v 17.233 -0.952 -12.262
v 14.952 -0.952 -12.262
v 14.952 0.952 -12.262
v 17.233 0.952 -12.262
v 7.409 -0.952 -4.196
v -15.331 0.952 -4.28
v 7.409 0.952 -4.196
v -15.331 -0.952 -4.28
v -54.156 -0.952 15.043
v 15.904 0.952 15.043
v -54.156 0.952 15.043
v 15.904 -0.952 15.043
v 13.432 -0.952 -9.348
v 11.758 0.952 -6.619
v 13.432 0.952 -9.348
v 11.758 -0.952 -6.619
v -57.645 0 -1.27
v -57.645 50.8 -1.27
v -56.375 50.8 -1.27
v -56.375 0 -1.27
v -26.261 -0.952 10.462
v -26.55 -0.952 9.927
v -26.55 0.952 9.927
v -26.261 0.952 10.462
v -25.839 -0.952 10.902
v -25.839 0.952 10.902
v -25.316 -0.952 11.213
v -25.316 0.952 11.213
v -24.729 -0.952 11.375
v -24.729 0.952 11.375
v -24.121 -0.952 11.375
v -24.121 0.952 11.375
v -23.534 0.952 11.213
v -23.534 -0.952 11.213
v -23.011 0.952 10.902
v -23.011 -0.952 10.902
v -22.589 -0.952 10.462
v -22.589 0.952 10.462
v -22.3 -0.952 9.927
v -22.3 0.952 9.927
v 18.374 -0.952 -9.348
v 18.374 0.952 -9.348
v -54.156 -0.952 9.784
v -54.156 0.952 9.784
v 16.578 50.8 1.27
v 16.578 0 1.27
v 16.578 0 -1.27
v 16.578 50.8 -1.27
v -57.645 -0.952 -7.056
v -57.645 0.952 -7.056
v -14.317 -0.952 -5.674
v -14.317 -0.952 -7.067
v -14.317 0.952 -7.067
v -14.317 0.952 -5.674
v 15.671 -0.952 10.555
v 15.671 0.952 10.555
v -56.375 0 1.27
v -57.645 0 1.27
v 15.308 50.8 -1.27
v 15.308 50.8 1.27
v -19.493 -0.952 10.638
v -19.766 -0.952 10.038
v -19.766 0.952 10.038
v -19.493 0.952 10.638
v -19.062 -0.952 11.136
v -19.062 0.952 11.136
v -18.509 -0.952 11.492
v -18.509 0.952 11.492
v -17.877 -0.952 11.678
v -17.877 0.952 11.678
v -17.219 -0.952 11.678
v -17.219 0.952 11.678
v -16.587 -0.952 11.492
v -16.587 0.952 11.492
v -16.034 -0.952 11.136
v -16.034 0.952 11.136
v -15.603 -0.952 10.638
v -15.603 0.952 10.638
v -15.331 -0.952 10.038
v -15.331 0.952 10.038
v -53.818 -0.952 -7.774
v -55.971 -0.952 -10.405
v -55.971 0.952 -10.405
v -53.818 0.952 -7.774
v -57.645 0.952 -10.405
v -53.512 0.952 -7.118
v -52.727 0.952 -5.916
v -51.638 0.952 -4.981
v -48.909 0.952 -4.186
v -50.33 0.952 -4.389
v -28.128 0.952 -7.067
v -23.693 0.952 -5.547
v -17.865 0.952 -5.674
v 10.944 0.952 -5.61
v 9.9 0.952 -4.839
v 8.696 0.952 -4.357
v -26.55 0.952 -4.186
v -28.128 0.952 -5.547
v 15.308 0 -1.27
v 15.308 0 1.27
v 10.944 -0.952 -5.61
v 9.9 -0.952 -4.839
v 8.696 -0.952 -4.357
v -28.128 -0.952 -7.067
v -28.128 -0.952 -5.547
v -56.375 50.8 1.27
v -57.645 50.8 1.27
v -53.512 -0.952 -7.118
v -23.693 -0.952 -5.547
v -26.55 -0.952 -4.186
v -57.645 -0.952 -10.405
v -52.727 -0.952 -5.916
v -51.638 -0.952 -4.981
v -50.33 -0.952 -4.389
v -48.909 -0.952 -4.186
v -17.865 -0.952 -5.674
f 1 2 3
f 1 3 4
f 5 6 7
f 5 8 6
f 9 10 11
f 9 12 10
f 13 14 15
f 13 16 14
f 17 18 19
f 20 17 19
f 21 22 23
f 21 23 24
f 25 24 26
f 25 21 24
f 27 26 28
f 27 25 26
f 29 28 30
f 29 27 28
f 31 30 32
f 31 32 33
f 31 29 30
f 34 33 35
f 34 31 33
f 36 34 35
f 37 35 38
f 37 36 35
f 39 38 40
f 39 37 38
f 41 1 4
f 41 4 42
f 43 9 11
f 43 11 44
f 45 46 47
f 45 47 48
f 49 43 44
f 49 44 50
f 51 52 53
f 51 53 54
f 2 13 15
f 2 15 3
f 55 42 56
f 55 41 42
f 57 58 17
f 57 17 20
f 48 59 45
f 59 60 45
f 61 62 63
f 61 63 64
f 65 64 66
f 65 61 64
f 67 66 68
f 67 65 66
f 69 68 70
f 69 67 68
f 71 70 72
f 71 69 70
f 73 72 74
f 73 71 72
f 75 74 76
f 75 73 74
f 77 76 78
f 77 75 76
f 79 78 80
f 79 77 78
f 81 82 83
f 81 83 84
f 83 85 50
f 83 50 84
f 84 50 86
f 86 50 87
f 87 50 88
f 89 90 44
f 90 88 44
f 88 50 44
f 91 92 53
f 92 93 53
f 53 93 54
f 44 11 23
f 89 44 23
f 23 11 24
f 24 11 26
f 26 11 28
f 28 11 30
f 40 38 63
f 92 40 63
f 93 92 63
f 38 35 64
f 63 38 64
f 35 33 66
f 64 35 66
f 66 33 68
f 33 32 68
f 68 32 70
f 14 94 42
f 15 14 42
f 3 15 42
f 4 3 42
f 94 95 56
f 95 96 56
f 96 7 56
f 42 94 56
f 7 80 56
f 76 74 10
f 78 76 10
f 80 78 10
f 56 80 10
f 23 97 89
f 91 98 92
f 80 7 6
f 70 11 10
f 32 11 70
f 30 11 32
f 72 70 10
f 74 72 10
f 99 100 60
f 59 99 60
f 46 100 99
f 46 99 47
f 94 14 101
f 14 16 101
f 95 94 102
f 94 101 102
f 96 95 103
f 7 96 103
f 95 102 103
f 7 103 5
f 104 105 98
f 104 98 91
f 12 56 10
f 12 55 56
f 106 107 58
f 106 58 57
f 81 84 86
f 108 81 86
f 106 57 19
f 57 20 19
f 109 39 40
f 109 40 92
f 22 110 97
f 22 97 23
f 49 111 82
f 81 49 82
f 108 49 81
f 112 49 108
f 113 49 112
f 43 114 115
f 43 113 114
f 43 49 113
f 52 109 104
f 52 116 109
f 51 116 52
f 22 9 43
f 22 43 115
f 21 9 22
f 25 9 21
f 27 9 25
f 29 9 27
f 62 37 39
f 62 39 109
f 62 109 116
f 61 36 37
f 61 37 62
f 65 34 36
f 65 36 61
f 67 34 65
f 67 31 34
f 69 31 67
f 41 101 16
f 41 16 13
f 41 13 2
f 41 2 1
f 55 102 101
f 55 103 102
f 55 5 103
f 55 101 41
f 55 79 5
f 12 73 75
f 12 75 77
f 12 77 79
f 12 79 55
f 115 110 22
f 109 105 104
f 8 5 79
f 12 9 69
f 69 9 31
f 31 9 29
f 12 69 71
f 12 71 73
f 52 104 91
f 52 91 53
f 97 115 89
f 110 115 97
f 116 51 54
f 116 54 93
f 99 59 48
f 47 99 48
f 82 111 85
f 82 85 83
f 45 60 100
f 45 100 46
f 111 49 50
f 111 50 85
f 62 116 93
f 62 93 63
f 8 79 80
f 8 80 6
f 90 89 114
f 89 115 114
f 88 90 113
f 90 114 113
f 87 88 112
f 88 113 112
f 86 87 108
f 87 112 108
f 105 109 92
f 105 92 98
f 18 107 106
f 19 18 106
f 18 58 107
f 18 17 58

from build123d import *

# Parameters (mm, degrees)
F1_DEPTH = 0.9525
F2_W     = 1.27
F2_H     = 50.8
F3_DEPTH = 1.27
F4_R     = 5.08


with BuildPart() as f1:
    # F0 (on Front) → F1 (new body, symmetric)
    with BuildSketch(Plane.XZ):
        with BuildLine():
            Line((15.904324, 15.04276), (-54.155879, 15.04276))
            Line((-54.155879, 15.04276), (-54.155879, 9.78379))
            Line((-54.155879, 9.78379), (-57.645474, -7.056188))
            Line((-57.645474, -7.056188), (-57.645474, -10.404889))
            Line((-57.645474, -10.404889), (-55.97112, -10.404889))
            Line((-55.97112, -10.404889), (-53.818386, -7.773767))
            Line((-53.818386, -7.773767), (-52.144036, -4.185874))
            Line((-52.144036, -4.185874), (-26.550405, -4.185874))
            Line((-26.550405, -4.185874), (-26.550405, 9.926503))
            ThreePointArc((-26.550405, 9.926503), (-24.425041, 11.395424), (-22.299677, 9.926503))
            Line((-22.299677, 9.926503), (-23.693465, -5.546857))
            Line((-23.693465, -5.546857), (-28.128244, -5.546857))
            Line((-28.128244, -5.546857), (-28.128244, -7.067353))
            Line((-28.128244, -7.067353), (-14.317074, -7.067353))
            Line((-14.317074, -7.067353), (-14.317074, -5.673565))
            Line((-14.317074, -5.673565), (-17.864898, -5.673565))
            Line((-17.864898, -5.673565), (-19.765517, 10.038225))
            ThreePointArc((-19.765517, 10.038225), (-17.548127, 11.701358), (-15.330737, 10.038225))
            Line((-15.330737, 10.038225), (-15.330737, -4.279777))
            Line((-15.330737, -4.279777), (10.264277, -4.185874))
            Line((10.264277, -4.185874), (13.431975, -9.348096))
            Line((13.431975, -9.348096), (14.952471, -12.262381))
            Line((14.952471, -12.262381), (17.233215, -12.262381))
            Line((17.233215, -12.262381), (18.373586, -9.348096))
            Line((18.373586, -9.348096), (15.671084, 10.555249))
            Line((15.671084, 10.555249), (15.904324, 15.04276))
        make_face()
    extrude(amount=F1_DEPTH, both=True)

    # F4
    f4_edges = [f1.edges().sort_by_distance(p)[0] for p in [
        (-52.144036, 0, -4.185874),
        (10.264277, 0, -4.185874),
    ]]
    fillet(f4_edges, radius=F4_R)


with BuildPart() as f3:
    # F2 (on Top) → F3 (new body, symmetric)
    with BuildSketch(Plane.XY):
        with Locations((-57.010474, 25.4)):
            Rectangle(F2_W, F2_H)
        with Locations((15.943341, 25.4)):
            Rectangle(F2_W, F2_H)
    extrude(amount=F3_DEPTH, both=True)


solid = Compound([f1.part, f3.part])
